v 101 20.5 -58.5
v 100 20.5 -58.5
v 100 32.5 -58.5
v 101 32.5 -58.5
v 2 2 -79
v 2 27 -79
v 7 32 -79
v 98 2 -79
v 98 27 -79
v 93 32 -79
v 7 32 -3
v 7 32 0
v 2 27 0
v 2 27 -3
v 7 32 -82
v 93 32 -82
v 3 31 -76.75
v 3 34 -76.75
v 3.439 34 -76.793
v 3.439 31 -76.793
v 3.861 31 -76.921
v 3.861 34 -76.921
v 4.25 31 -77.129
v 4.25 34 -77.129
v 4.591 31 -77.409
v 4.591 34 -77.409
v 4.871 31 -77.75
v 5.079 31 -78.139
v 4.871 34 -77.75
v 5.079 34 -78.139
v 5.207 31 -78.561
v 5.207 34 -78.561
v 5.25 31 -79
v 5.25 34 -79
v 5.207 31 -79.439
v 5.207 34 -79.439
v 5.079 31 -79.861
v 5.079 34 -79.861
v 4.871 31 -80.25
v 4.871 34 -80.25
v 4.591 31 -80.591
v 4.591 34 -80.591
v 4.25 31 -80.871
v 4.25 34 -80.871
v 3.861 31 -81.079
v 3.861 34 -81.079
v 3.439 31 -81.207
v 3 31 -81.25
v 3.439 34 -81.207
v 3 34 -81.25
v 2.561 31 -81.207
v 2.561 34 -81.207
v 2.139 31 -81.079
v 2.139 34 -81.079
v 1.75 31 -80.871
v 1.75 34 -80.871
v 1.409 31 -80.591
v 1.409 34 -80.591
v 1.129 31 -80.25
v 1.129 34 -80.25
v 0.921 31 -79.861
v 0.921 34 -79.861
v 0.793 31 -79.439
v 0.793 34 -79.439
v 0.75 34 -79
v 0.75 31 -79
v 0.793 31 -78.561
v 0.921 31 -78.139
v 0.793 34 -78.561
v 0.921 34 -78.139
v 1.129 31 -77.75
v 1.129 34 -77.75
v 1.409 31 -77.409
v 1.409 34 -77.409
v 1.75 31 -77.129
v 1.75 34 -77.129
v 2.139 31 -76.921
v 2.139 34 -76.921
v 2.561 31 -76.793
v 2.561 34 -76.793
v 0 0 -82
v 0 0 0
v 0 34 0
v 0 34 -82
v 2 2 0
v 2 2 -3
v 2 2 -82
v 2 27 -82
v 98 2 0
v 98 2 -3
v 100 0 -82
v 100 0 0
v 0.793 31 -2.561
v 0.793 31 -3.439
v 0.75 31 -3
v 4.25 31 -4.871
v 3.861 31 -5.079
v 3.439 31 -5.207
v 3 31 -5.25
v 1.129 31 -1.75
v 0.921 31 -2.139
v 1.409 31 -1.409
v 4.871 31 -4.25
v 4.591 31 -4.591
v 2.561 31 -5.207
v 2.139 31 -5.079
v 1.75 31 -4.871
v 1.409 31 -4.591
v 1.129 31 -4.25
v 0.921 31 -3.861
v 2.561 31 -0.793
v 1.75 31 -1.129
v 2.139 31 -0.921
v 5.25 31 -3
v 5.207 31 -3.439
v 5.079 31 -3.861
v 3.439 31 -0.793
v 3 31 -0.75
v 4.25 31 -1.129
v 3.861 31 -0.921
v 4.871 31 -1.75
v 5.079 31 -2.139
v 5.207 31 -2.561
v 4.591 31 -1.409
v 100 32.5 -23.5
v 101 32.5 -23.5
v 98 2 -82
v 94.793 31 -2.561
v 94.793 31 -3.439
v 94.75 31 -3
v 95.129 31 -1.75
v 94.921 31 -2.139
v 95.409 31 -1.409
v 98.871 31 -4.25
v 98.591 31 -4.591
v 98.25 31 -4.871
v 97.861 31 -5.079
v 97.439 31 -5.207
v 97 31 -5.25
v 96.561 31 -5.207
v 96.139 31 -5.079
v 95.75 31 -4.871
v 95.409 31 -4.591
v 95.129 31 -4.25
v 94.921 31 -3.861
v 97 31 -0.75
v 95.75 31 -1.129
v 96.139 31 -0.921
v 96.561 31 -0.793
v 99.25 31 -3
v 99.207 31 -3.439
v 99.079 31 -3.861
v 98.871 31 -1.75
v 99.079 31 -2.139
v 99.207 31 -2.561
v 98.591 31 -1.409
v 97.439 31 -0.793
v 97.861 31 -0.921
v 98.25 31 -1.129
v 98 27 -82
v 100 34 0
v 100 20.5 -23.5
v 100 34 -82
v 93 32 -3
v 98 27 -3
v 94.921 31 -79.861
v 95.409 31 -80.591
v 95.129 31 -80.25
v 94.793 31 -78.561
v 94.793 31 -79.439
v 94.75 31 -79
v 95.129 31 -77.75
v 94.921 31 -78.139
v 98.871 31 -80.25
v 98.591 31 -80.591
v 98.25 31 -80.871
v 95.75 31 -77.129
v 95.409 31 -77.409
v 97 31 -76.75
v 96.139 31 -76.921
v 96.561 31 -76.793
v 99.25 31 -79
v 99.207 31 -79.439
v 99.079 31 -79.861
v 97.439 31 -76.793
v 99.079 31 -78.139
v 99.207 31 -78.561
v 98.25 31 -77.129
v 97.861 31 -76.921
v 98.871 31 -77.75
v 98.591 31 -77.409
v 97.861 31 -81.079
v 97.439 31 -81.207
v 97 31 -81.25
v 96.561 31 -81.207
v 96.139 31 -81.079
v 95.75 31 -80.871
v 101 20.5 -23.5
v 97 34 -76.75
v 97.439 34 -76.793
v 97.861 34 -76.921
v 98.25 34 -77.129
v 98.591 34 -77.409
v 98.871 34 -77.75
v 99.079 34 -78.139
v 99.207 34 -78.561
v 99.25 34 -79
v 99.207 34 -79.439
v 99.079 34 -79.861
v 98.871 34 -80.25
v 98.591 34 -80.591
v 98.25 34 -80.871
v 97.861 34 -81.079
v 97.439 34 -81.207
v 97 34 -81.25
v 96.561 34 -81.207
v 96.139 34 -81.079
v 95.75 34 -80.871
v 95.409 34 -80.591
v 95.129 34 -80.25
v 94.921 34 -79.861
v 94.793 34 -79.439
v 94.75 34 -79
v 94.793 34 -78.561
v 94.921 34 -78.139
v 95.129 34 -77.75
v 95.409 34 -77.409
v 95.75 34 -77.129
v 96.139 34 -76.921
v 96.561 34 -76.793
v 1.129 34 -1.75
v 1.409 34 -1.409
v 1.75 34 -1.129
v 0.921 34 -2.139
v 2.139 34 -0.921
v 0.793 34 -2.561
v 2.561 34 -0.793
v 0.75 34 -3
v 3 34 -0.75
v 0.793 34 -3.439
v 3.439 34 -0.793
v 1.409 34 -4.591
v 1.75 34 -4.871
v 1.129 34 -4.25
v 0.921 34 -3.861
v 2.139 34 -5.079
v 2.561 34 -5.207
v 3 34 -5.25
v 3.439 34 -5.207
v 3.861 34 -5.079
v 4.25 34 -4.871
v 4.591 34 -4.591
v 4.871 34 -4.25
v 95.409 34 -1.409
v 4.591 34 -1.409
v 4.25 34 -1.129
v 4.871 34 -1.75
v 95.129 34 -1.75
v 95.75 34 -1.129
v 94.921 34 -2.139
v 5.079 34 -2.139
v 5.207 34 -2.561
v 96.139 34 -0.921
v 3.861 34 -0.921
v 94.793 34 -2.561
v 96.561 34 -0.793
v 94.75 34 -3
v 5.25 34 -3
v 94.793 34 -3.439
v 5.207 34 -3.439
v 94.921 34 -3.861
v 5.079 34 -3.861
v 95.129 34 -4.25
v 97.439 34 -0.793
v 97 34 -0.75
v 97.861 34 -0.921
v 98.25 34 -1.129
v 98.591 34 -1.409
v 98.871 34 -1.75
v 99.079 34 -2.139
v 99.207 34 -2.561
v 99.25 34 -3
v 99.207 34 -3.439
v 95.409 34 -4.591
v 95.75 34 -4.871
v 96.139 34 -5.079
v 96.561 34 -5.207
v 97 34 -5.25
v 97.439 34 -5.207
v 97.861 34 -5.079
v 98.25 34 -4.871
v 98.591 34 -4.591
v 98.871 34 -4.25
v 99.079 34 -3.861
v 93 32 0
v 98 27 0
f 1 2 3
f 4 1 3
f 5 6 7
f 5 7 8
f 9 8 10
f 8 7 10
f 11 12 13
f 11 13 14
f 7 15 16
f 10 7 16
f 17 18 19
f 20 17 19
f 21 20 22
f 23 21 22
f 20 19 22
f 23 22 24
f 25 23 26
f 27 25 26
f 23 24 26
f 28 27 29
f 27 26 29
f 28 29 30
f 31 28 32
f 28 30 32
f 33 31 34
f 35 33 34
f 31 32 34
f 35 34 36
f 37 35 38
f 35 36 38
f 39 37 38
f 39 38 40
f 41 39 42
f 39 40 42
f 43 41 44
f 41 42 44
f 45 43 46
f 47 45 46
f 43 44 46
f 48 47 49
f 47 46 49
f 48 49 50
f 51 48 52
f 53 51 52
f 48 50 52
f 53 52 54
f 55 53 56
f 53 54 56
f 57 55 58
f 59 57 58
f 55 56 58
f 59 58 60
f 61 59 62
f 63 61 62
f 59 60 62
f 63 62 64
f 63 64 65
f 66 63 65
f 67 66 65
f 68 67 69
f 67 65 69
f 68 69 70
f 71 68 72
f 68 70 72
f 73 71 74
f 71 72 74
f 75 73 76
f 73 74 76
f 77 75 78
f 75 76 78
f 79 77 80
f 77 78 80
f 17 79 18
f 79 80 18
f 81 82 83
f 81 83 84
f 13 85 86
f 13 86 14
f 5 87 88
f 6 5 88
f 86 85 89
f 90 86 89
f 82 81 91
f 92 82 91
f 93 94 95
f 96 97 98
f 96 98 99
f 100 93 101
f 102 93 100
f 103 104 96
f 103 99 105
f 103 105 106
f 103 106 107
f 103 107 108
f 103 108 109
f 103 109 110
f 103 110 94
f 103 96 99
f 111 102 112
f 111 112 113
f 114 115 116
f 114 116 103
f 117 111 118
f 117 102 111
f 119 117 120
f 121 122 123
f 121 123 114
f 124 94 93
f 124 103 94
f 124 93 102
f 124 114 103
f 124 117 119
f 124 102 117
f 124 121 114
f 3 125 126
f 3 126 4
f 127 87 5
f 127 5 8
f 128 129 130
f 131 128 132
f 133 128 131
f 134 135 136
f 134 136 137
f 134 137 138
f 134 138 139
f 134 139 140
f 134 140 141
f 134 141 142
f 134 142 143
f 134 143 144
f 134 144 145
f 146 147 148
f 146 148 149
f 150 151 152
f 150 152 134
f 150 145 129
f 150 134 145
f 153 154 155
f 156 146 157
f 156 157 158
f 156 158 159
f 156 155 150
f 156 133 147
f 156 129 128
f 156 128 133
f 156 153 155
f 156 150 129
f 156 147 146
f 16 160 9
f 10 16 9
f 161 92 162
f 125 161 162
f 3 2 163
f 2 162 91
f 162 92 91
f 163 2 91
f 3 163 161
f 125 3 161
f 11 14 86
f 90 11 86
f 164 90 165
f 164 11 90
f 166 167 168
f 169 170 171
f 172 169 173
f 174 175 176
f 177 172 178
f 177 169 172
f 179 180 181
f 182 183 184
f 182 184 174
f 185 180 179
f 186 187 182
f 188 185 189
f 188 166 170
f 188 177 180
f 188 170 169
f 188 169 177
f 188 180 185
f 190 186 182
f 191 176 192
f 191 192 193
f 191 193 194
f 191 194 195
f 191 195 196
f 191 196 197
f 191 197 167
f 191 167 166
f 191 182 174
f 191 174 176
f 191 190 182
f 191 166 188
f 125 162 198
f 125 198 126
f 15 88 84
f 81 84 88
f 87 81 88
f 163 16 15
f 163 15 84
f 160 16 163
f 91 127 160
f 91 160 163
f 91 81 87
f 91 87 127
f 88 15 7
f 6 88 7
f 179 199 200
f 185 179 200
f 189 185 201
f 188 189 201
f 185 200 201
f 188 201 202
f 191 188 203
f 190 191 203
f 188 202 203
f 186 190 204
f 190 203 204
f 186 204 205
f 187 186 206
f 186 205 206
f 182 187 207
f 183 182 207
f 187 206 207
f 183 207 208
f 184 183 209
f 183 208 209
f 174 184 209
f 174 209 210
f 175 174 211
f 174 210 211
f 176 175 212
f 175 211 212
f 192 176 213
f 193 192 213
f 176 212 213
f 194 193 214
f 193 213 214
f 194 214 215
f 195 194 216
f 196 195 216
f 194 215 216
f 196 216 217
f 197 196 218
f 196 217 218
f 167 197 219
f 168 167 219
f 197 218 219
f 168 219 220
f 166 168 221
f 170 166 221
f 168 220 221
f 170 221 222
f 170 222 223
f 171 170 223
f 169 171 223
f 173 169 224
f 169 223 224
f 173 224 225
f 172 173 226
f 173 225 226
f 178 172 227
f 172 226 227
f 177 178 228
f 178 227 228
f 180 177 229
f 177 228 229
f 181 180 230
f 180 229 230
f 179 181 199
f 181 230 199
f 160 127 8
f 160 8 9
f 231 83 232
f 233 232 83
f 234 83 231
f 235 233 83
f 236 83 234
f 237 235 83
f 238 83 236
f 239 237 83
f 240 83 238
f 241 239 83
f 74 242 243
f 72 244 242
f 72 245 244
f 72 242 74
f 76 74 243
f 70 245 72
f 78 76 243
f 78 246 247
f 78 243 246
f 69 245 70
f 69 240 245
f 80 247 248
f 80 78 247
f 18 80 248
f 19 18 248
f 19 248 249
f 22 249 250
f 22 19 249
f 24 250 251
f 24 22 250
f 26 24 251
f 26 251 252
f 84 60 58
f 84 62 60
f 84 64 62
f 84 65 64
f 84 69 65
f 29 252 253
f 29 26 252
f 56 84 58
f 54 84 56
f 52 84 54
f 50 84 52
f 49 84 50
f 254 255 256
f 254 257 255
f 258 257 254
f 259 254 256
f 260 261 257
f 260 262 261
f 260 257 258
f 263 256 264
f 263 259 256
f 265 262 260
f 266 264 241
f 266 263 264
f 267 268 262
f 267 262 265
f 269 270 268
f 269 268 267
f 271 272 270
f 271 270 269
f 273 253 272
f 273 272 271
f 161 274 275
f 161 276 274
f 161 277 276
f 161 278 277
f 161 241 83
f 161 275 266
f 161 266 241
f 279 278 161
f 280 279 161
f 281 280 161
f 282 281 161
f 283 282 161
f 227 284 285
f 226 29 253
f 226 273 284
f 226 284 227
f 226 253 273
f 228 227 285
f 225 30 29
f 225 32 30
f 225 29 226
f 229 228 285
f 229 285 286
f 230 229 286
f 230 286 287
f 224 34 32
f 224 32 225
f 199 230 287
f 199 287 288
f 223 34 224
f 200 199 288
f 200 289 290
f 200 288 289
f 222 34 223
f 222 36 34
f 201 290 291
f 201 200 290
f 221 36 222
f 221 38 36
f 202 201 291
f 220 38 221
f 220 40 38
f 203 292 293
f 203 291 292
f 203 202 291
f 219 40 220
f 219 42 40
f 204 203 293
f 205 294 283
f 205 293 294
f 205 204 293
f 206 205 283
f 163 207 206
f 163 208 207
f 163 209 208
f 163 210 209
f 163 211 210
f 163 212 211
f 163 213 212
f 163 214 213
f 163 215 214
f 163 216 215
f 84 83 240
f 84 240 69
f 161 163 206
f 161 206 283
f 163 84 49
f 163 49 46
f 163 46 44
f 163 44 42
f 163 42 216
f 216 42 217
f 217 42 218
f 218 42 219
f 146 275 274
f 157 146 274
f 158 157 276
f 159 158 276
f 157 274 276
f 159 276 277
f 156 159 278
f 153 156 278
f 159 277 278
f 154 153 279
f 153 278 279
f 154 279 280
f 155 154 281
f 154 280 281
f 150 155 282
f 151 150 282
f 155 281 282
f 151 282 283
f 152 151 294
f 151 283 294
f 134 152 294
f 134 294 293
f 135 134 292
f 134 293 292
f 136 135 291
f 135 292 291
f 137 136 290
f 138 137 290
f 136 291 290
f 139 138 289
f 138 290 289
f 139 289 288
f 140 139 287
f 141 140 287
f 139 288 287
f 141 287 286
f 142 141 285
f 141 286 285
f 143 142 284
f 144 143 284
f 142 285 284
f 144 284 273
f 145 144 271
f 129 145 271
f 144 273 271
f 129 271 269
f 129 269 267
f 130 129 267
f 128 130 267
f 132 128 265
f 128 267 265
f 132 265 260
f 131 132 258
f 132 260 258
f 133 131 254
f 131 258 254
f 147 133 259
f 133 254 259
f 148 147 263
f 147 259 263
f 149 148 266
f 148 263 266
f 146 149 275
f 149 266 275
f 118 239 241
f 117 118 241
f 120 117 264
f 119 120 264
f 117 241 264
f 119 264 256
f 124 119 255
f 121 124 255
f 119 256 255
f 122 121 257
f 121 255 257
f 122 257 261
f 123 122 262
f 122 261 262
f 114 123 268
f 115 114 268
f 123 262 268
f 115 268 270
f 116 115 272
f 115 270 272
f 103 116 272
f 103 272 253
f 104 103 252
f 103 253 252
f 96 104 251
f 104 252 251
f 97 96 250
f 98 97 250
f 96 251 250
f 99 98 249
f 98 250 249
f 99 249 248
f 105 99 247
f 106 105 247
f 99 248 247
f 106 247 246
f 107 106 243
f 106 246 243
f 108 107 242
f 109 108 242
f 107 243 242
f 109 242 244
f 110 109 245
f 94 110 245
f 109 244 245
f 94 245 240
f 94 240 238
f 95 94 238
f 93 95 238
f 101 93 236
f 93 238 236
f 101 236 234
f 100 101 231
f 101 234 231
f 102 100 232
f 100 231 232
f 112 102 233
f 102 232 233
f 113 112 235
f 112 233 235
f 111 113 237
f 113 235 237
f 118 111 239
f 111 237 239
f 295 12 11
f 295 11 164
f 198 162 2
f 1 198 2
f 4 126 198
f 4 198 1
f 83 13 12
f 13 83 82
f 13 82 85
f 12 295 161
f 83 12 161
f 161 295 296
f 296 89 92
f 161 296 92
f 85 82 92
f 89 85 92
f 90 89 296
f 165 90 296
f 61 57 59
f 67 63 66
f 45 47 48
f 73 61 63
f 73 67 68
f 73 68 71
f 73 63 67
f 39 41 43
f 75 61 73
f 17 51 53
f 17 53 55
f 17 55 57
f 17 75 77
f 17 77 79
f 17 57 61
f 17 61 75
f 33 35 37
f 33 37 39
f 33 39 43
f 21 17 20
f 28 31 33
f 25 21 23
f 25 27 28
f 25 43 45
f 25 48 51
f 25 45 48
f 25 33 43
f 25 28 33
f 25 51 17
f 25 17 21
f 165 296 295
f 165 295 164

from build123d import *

# Parameters (mm, degrees)
SKETCH1_W                = 100
SKETCH1_H                = 82
BOSS_EXTRUDE1_DEPTH      = 34
SKETCH2_W                = 96
SKETCH2_H                = 30
CUT_EXTRUDE1_DEPTH       = 3
CHAMFER1_SIZE            = 5
CHAMFER1_OF_MIRROR4_SIZE = 5
SKETCH3_R                = 2.25
CUT_EXTRUDE2_DEPTH       = 3
SKETCH4_W                = 35
SKETCH4_H                = 12
BOSS_EXTRUDE2_DEPTH      = 1


with BuildPart() as part:
    # Sketch1 → Boss-Extrude1 (new body)
    with BuildSketch(Plane(origin=(0, 0, 0), x_dir=(1, 0, 0), z_dir=(0, 1, 0))):
        with Locations((50, 41)):
            Rectangle(SKETCH1_W, SKETCH1_H)
    extrude(amount=BOSS_EXTRUDE1_DEPTH)

    # Sketch2 → Cut-Extrude1 (cut)
    with BuildSketch(Plane.XY):
        with Locations((50, 17)):
            Rectangle(SKETCH2_W, SKETCH2_H)
    cut_extrude1 = extrude(amount=-CUT_EXTRUDE1_DEPTH, mode=Mode.SUBTRACT)

    # Chamfer1
    chamfer1_edges = [part.edges().sort_by_distance(p)[0] for p in [
        (2, 32, -1.5),
        (98, 32, -1.5),
    ]]
    chamfer(chamfer1_edges, length=CHAMFER1_SIZE)

    # Mirror4: Cut-Extrude1 across plane
    add(cut_extrude1.mirror(Plane.XY.offset(-41)), mode=Mode.SUBTRACT)

    # Chamfer1 of Mirror4
    chamfer1_of_mirror4_edges = [part.edges().sort_by_distance(p)[0] for p in [
        (2, 32, -80.5),
        (98, 32, -80.5),
    ]]
    chamfer(chamfer1_of_mirror4_edges, length=CHAMFER1_OF_MIRROR4_SIZE)

    # Sketch3 → Cut-Extrude2 (cut)
    with BuildSketch(Plane(origin=(0, 34, 0), x_dir=(1, 0, 0), z_dir=(0, 1, 0))):
        with Locations(Location((3, 79, 0), (0, 0, 270))):
            Circle(SKETCH3_R)
        with Locations(Location((3, 3, 0), (0, 0, 270))):
            Circle(SKETCH3_R)
        with Locations(Location((97, 3, 0), (0, 0, 270))):
            Circle(SKETCH3_R)
        with Locations(Location((97, 79, 0), (0, 0, 270))):
            Circle(SKETCH3_R)
    extrude(amount=-CUT_EXTRUDE2_DEPTH, mode=Mode.SUBTRACT)

    # Sketch4 → Boss-Extrude2 (add)
    with BuildSketch(Plane(origin=(100, 0, 0), x_dir=(0, 0, -1), z_dir=(1, 0, 0))):
        with Locations((41, 26.5)):
            Rectangle(SKETCH4_W, SKETCH4_H)
    extrude(amount=BOSS_EXTRUDE2_DEPTH)


solid = part.part
